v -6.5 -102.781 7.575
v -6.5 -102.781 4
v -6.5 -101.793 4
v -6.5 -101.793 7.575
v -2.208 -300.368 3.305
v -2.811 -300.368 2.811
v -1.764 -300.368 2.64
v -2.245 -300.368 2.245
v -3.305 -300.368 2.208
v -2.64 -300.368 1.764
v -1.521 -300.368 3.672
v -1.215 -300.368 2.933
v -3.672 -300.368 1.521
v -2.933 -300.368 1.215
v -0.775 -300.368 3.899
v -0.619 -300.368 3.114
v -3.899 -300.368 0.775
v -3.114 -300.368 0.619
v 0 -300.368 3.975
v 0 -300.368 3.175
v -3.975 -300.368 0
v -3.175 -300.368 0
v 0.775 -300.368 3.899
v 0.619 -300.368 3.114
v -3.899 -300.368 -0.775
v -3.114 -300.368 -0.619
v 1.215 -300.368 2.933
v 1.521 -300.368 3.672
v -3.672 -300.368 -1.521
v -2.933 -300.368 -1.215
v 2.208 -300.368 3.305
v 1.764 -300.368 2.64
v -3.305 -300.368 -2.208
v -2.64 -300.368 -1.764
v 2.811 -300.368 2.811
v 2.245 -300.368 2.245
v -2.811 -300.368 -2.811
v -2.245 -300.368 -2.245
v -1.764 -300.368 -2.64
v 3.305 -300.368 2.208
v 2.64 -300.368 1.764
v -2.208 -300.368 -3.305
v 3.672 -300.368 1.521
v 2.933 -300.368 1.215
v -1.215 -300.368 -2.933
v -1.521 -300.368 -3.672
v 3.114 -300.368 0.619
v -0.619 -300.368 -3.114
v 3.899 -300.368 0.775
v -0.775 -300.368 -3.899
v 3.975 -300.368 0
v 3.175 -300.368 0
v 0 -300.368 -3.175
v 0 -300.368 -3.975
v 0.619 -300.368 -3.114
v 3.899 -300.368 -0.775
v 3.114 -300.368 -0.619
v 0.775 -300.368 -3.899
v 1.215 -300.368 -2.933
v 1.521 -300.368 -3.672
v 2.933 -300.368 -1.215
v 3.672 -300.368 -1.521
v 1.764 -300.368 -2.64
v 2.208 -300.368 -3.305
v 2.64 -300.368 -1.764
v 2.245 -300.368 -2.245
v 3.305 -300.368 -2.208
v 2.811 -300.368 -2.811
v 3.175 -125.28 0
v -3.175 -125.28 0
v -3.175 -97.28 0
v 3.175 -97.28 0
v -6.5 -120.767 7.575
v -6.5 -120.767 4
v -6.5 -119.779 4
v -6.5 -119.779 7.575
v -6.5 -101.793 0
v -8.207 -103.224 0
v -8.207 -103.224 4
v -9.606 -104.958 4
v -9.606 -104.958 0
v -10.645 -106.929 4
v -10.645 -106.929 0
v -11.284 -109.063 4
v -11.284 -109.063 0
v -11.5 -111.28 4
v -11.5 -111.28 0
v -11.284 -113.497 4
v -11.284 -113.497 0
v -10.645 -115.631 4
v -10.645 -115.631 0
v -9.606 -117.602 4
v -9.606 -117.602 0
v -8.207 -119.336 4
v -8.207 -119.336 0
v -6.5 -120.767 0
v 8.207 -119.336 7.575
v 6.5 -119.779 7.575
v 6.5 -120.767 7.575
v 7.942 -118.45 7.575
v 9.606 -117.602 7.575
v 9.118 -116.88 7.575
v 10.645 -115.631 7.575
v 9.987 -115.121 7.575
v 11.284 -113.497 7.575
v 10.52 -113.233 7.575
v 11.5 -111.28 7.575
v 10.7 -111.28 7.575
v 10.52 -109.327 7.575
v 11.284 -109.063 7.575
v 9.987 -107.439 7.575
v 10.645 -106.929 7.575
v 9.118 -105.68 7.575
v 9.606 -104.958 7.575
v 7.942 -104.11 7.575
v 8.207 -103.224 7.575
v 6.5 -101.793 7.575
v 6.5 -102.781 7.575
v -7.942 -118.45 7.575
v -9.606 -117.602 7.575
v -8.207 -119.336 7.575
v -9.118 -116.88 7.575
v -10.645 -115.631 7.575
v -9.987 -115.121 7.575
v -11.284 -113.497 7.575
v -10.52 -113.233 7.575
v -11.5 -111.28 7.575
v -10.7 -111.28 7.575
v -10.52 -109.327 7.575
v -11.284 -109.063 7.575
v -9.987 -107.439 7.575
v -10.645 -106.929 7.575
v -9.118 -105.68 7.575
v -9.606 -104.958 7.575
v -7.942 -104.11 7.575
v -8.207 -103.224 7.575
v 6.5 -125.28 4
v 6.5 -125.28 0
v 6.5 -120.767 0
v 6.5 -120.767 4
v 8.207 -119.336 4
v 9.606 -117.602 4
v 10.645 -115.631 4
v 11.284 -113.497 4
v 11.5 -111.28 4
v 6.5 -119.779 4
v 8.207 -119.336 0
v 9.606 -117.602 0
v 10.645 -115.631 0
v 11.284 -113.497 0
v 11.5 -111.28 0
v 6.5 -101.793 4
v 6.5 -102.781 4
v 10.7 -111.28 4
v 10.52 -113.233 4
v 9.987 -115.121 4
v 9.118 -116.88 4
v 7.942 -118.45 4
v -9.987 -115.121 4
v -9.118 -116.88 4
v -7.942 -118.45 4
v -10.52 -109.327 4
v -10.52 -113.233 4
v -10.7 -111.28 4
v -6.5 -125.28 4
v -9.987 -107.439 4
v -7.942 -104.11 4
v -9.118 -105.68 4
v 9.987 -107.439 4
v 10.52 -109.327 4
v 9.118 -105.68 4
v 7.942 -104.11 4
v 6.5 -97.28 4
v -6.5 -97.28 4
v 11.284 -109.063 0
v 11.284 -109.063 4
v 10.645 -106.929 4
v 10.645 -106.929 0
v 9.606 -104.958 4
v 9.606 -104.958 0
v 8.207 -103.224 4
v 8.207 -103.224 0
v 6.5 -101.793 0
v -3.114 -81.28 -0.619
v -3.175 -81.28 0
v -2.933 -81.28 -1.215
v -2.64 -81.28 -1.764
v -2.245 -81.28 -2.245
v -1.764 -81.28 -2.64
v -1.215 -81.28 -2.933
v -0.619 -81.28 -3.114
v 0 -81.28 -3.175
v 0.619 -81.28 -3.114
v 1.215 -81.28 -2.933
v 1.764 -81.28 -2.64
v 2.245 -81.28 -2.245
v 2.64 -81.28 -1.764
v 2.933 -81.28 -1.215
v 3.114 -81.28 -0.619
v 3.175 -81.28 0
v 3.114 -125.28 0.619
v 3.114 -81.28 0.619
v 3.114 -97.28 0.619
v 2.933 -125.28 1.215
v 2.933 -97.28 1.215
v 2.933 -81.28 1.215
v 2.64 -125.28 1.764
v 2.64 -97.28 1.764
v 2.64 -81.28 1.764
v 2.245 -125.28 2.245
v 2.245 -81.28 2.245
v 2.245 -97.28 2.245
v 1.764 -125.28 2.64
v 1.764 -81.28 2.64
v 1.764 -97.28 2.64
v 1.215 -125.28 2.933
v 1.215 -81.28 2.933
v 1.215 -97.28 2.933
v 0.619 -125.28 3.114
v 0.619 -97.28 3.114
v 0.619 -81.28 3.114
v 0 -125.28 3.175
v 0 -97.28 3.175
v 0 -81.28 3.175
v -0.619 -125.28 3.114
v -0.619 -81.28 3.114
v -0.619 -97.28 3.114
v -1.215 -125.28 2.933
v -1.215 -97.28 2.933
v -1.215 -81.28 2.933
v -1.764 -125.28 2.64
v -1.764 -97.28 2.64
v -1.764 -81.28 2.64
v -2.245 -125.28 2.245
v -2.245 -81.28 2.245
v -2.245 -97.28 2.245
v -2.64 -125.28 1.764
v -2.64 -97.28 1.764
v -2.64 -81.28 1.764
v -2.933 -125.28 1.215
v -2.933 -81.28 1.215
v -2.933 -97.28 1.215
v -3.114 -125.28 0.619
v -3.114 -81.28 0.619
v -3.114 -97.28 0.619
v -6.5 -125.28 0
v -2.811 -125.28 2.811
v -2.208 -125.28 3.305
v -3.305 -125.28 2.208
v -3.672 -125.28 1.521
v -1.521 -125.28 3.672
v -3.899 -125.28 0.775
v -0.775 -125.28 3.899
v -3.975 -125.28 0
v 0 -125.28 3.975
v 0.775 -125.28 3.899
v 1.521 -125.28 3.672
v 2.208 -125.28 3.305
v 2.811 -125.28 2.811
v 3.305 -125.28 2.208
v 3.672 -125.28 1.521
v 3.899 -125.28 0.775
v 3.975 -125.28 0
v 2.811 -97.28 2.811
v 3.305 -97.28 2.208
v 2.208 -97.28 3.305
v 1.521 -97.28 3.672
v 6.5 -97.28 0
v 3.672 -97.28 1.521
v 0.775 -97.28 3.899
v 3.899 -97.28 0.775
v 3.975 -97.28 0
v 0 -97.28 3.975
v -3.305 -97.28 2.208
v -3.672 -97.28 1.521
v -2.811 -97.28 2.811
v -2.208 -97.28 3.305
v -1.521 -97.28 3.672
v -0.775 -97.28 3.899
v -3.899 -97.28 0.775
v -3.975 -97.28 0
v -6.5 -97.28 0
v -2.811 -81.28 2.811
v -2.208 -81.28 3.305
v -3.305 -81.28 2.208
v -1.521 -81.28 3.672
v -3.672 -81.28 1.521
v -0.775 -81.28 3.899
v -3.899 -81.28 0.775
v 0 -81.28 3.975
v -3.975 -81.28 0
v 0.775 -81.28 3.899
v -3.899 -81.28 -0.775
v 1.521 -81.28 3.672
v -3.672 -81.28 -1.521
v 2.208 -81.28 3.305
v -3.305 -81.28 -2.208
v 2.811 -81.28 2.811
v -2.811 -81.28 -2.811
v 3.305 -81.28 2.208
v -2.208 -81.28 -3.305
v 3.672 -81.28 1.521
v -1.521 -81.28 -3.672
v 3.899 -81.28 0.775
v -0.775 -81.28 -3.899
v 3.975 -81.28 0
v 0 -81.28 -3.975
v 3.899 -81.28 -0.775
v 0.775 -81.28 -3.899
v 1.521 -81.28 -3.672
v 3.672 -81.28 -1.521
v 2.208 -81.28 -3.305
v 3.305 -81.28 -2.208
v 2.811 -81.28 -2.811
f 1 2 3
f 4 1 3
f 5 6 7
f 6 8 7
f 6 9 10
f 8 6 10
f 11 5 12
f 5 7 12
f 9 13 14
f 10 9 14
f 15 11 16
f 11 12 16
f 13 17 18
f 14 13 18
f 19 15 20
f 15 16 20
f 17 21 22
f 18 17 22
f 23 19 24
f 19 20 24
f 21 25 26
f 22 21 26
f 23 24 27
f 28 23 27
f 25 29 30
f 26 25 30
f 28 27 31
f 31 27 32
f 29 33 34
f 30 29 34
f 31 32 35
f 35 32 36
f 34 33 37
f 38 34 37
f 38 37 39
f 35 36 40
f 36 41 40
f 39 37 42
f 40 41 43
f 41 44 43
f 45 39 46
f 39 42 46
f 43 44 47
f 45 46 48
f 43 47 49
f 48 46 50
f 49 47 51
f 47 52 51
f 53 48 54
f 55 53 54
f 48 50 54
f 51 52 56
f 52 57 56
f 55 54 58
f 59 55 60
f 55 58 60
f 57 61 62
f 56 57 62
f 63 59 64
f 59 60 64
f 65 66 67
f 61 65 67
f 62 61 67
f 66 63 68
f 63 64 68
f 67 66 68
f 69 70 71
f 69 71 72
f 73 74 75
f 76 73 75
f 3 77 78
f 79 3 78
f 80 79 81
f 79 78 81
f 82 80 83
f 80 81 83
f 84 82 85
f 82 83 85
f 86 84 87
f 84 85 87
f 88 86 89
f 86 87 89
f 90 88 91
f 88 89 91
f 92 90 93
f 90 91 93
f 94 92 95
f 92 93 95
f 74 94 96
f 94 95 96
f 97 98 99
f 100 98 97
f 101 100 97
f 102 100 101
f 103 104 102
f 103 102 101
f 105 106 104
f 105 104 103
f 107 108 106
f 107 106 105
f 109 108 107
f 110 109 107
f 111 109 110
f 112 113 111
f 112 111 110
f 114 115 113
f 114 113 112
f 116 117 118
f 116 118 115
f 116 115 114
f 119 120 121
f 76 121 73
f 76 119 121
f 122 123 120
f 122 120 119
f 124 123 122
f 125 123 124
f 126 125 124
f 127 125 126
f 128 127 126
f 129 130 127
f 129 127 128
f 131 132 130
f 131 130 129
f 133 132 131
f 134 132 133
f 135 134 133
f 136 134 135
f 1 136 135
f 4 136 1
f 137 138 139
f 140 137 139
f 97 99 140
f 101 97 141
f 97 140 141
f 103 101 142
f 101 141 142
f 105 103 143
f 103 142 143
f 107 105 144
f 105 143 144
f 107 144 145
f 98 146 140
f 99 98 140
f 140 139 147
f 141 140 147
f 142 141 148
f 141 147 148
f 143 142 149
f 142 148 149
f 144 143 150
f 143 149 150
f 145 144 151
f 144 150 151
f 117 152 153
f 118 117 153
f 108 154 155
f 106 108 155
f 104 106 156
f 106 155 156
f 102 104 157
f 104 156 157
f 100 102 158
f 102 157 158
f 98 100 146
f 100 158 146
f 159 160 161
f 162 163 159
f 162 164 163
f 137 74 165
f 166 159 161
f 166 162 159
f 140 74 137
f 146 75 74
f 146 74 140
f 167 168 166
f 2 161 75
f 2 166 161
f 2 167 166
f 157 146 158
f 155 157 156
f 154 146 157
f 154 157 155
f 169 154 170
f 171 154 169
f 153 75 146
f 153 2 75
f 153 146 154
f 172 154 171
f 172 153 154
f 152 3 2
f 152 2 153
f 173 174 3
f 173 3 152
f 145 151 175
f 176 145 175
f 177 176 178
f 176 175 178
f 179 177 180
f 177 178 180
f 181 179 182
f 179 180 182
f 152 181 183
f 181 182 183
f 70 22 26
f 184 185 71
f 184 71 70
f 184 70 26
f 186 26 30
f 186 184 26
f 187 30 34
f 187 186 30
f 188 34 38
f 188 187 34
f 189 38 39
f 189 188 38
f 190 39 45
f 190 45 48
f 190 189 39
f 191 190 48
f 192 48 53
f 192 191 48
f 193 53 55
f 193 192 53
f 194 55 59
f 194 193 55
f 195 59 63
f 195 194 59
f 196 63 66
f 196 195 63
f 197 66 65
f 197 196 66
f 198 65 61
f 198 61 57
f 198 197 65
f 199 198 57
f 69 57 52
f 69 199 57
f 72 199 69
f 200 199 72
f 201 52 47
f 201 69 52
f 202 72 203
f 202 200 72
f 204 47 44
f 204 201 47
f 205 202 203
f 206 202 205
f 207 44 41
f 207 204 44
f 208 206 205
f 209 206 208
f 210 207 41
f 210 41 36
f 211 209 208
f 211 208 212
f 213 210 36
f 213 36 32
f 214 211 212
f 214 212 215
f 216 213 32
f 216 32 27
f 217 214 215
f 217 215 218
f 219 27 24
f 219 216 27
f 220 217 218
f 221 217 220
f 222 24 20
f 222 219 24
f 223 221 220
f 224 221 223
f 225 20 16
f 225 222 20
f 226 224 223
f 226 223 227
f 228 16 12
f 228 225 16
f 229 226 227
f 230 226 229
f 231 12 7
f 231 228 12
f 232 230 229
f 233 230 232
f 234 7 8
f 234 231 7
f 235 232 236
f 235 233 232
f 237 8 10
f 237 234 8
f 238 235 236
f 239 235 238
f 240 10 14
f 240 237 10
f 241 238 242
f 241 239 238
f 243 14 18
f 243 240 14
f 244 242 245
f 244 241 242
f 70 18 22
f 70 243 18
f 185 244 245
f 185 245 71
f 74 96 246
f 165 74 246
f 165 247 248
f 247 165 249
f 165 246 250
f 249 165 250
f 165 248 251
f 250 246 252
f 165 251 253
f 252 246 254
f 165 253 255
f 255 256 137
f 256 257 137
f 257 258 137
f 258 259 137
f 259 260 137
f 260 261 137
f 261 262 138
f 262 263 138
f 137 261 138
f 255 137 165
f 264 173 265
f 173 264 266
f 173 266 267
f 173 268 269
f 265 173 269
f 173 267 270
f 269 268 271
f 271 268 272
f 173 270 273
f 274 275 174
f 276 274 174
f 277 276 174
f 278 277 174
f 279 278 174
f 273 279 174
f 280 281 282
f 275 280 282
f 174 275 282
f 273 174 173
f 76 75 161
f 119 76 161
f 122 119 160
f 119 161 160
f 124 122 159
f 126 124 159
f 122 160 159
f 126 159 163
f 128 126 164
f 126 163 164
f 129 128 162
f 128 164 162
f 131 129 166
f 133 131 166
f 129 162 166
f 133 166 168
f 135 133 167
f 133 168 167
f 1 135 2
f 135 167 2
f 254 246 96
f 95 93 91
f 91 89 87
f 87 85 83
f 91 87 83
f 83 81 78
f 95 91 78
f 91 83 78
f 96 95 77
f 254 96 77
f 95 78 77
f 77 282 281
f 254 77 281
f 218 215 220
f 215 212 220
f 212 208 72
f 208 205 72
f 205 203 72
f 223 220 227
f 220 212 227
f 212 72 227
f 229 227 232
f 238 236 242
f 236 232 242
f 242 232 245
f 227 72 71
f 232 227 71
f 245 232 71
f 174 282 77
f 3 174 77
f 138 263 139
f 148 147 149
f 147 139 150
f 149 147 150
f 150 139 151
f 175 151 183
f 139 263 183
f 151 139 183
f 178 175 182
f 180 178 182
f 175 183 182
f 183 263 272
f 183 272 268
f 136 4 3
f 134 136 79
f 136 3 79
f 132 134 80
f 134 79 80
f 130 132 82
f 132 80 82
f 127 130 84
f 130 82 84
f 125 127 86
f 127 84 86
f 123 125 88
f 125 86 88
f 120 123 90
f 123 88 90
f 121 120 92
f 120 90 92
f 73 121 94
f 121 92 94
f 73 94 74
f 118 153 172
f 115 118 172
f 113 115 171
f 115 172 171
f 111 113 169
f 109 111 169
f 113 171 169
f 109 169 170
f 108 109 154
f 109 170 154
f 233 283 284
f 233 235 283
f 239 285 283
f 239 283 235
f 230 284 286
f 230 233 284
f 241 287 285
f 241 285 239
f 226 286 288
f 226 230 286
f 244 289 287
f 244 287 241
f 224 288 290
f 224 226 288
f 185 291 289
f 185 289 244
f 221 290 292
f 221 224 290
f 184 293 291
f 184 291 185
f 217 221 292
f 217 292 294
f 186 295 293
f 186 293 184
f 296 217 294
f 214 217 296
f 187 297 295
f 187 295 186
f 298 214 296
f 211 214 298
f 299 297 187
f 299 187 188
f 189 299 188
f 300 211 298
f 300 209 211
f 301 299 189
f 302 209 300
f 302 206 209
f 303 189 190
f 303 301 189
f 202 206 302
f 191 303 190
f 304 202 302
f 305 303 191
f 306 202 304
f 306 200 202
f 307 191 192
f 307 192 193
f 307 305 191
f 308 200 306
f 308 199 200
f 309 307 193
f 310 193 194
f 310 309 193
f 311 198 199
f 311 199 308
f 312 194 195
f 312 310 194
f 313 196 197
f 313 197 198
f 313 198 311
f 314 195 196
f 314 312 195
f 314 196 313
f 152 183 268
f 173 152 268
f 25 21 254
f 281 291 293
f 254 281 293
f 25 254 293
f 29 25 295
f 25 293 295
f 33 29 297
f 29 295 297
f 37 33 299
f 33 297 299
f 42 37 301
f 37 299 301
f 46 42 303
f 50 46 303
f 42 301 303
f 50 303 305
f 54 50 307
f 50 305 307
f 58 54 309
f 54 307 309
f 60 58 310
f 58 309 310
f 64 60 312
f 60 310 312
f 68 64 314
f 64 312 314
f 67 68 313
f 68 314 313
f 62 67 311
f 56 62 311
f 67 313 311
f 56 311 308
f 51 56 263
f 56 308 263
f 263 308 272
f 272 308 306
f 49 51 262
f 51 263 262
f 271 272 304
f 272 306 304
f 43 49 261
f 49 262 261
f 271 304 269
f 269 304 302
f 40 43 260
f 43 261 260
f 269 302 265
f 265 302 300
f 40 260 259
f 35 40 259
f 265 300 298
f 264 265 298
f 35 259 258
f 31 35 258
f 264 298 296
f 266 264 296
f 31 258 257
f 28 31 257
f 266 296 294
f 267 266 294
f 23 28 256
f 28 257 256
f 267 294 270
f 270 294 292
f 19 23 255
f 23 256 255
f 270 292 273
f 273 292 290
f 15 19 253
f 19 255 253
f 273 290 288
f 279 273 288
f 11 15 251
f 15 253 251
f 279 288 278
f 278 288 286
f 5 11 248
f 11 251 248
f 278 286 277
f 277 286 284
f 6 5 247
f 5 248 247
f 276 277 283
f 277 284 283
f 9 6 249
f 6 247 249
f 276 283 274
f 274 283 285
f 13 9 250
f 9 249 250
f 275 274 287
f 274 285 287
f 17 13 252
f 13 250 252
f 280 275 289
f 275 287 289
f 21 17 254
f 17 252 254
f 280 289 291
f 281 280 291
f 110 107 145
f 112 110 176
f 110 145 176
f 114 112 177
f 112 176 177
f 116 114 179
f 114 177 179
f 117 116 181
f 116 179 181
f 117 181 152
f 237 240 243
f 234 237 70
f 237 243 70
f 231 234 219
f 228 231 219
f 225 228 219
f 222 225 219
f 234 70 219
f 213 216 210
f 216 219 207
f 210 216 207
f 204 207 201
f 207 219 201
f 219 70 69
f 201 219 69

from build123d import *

# Parameters (mm, degrees)
SKETCH1_W           = 0.8
SKETCH1_H           = 219.088379857
BOSS_EXTRUDE2_DEPTH = 4
BOSS_EXTRUDE3_DEPTH = 3.575


with BuildPart() as part:
    # Sketch1 → Revolve1 (revolve)
    with BuildSketch(Plane.XY, mode=Mode.PRIVATE) as revolve1_sk:
        with Locations((3.575, -190.824189929)):
            Rectangle(SKETCH1_W, SKETCH1_H)
    revolve(revolve1_sk.sketch.rotate(Axis((0, 0, 0), (0, -1, 0)), 180), axis=Axis((0, 0, 0), (0, -1, 0)))

    # Sketch17 → Boss-Extrude2 (add)
    with BuildSketch(Plane(origin=(0, 58.900156663, 0), x_dir=(1, 0, 0), z_dir=(0, 0, 1))):
        with BuildLine():
            ThreePointArc((6.5, -160.693323683), (0, -158.680156663), (-6.5, -160.693323683))
            Line((-6.5, -160.693323683), (-6.5, -179.666989644))
            ThreePointArc((-6.5, -179.666989644), (0, -181.680156663), (6.5, -179.666989644))
            Line((6.5, -179.666989644), (6.5, -160.693323683))
        make_face()
        with BuildLine():
            Line((-6.5, -179.666989644), (-6.5, -160.693323683))
            ThreePointArc((-6.5, -160.693323683), (-11.5, -170.180156663), (-6.5, -179.666989644))
        make_face()
        with BuildLine():
            Line((6.5, -156.180156663), (-6.5, -156.180156663))
            Line((-6.5, -156.180156663), (-6.5, -160.693323683))
            ThreePointArc((-6.5, -160.693323683), (0, -158.680156663), (6.5, -160.693323683))
            Line((6.5, -160.693323683), (6.5, -156.180156663))
        make_face()
        with BuildLine():
            ThreePointArc((11.5, -170.180156663), (10.173494975, -164.818254016), (6.5, -160.693323683))
            Line((6.5, -160.693323683), (6.5, -179.666989644))
            ThreePointArc((6.5, -179.666989644), (10.173494975, -175.542059311), (11.5, -170.180156663))
        make_face()
        with BuildLine():
            ThreePointArc((6.5, -179.666989644), (0, -181.680156663), (-6.5, -179.666989644))
            Line((-6.5, -179.666989644), (-6.5, -184.180156663))
            Line((-6.5, -184.180156663), (6.5, -184.180156663))
            Line((6.5, -184.180156663), (6.5, -179.666989644))
        make_face()
    extrude(amount=BOSS_EXTRUDE2_DEPTH)

    # Sketch18 → Boss-Extrude3 (add)
    with BuildSketch(Plane.XY.offset(4)):
        with BuildLine():
            ThreePointArc((-6.5, -101.793167019), (-11.5, -111.28), (-6.5, -120.766832981))
            Line((-6.5, -120.766832981), (-6.5, -119.779411744))
            ThreePointArc((-6.5, -119.779411744), (-10.7, -111.28), (-6.5, -102.780588256))
            Line((-6.5, -102.780588256), (-6.5, -101.793167019))
        make_face()
        with BuildLine():
            Line((6.5, -119.779411744), (6.5, -120.766832981))
            ThreePointArc((6.5, -120.766832981), (10.173494975, -116.641902647), (11.5, -111.28))
            ThreePointArc((11.5, -111.28), (10.173494975, -105.918097353), (6.5, -101.793167019))
            Line((6.5, -101.793167019), (6.5, -102.780588256))
            ThreePointArc((6.5, -102.780588256), (9.592705562, -106.539746842), (10.7, -111.28))
            ThreePointArc((10.7, -111.28), (9.592705562, -116.020253158), (6.5, -119.779411744))
        make_face()
    extrude(amount=BOSS_EXTRUDE3_DEPTH)


solid = part.part
